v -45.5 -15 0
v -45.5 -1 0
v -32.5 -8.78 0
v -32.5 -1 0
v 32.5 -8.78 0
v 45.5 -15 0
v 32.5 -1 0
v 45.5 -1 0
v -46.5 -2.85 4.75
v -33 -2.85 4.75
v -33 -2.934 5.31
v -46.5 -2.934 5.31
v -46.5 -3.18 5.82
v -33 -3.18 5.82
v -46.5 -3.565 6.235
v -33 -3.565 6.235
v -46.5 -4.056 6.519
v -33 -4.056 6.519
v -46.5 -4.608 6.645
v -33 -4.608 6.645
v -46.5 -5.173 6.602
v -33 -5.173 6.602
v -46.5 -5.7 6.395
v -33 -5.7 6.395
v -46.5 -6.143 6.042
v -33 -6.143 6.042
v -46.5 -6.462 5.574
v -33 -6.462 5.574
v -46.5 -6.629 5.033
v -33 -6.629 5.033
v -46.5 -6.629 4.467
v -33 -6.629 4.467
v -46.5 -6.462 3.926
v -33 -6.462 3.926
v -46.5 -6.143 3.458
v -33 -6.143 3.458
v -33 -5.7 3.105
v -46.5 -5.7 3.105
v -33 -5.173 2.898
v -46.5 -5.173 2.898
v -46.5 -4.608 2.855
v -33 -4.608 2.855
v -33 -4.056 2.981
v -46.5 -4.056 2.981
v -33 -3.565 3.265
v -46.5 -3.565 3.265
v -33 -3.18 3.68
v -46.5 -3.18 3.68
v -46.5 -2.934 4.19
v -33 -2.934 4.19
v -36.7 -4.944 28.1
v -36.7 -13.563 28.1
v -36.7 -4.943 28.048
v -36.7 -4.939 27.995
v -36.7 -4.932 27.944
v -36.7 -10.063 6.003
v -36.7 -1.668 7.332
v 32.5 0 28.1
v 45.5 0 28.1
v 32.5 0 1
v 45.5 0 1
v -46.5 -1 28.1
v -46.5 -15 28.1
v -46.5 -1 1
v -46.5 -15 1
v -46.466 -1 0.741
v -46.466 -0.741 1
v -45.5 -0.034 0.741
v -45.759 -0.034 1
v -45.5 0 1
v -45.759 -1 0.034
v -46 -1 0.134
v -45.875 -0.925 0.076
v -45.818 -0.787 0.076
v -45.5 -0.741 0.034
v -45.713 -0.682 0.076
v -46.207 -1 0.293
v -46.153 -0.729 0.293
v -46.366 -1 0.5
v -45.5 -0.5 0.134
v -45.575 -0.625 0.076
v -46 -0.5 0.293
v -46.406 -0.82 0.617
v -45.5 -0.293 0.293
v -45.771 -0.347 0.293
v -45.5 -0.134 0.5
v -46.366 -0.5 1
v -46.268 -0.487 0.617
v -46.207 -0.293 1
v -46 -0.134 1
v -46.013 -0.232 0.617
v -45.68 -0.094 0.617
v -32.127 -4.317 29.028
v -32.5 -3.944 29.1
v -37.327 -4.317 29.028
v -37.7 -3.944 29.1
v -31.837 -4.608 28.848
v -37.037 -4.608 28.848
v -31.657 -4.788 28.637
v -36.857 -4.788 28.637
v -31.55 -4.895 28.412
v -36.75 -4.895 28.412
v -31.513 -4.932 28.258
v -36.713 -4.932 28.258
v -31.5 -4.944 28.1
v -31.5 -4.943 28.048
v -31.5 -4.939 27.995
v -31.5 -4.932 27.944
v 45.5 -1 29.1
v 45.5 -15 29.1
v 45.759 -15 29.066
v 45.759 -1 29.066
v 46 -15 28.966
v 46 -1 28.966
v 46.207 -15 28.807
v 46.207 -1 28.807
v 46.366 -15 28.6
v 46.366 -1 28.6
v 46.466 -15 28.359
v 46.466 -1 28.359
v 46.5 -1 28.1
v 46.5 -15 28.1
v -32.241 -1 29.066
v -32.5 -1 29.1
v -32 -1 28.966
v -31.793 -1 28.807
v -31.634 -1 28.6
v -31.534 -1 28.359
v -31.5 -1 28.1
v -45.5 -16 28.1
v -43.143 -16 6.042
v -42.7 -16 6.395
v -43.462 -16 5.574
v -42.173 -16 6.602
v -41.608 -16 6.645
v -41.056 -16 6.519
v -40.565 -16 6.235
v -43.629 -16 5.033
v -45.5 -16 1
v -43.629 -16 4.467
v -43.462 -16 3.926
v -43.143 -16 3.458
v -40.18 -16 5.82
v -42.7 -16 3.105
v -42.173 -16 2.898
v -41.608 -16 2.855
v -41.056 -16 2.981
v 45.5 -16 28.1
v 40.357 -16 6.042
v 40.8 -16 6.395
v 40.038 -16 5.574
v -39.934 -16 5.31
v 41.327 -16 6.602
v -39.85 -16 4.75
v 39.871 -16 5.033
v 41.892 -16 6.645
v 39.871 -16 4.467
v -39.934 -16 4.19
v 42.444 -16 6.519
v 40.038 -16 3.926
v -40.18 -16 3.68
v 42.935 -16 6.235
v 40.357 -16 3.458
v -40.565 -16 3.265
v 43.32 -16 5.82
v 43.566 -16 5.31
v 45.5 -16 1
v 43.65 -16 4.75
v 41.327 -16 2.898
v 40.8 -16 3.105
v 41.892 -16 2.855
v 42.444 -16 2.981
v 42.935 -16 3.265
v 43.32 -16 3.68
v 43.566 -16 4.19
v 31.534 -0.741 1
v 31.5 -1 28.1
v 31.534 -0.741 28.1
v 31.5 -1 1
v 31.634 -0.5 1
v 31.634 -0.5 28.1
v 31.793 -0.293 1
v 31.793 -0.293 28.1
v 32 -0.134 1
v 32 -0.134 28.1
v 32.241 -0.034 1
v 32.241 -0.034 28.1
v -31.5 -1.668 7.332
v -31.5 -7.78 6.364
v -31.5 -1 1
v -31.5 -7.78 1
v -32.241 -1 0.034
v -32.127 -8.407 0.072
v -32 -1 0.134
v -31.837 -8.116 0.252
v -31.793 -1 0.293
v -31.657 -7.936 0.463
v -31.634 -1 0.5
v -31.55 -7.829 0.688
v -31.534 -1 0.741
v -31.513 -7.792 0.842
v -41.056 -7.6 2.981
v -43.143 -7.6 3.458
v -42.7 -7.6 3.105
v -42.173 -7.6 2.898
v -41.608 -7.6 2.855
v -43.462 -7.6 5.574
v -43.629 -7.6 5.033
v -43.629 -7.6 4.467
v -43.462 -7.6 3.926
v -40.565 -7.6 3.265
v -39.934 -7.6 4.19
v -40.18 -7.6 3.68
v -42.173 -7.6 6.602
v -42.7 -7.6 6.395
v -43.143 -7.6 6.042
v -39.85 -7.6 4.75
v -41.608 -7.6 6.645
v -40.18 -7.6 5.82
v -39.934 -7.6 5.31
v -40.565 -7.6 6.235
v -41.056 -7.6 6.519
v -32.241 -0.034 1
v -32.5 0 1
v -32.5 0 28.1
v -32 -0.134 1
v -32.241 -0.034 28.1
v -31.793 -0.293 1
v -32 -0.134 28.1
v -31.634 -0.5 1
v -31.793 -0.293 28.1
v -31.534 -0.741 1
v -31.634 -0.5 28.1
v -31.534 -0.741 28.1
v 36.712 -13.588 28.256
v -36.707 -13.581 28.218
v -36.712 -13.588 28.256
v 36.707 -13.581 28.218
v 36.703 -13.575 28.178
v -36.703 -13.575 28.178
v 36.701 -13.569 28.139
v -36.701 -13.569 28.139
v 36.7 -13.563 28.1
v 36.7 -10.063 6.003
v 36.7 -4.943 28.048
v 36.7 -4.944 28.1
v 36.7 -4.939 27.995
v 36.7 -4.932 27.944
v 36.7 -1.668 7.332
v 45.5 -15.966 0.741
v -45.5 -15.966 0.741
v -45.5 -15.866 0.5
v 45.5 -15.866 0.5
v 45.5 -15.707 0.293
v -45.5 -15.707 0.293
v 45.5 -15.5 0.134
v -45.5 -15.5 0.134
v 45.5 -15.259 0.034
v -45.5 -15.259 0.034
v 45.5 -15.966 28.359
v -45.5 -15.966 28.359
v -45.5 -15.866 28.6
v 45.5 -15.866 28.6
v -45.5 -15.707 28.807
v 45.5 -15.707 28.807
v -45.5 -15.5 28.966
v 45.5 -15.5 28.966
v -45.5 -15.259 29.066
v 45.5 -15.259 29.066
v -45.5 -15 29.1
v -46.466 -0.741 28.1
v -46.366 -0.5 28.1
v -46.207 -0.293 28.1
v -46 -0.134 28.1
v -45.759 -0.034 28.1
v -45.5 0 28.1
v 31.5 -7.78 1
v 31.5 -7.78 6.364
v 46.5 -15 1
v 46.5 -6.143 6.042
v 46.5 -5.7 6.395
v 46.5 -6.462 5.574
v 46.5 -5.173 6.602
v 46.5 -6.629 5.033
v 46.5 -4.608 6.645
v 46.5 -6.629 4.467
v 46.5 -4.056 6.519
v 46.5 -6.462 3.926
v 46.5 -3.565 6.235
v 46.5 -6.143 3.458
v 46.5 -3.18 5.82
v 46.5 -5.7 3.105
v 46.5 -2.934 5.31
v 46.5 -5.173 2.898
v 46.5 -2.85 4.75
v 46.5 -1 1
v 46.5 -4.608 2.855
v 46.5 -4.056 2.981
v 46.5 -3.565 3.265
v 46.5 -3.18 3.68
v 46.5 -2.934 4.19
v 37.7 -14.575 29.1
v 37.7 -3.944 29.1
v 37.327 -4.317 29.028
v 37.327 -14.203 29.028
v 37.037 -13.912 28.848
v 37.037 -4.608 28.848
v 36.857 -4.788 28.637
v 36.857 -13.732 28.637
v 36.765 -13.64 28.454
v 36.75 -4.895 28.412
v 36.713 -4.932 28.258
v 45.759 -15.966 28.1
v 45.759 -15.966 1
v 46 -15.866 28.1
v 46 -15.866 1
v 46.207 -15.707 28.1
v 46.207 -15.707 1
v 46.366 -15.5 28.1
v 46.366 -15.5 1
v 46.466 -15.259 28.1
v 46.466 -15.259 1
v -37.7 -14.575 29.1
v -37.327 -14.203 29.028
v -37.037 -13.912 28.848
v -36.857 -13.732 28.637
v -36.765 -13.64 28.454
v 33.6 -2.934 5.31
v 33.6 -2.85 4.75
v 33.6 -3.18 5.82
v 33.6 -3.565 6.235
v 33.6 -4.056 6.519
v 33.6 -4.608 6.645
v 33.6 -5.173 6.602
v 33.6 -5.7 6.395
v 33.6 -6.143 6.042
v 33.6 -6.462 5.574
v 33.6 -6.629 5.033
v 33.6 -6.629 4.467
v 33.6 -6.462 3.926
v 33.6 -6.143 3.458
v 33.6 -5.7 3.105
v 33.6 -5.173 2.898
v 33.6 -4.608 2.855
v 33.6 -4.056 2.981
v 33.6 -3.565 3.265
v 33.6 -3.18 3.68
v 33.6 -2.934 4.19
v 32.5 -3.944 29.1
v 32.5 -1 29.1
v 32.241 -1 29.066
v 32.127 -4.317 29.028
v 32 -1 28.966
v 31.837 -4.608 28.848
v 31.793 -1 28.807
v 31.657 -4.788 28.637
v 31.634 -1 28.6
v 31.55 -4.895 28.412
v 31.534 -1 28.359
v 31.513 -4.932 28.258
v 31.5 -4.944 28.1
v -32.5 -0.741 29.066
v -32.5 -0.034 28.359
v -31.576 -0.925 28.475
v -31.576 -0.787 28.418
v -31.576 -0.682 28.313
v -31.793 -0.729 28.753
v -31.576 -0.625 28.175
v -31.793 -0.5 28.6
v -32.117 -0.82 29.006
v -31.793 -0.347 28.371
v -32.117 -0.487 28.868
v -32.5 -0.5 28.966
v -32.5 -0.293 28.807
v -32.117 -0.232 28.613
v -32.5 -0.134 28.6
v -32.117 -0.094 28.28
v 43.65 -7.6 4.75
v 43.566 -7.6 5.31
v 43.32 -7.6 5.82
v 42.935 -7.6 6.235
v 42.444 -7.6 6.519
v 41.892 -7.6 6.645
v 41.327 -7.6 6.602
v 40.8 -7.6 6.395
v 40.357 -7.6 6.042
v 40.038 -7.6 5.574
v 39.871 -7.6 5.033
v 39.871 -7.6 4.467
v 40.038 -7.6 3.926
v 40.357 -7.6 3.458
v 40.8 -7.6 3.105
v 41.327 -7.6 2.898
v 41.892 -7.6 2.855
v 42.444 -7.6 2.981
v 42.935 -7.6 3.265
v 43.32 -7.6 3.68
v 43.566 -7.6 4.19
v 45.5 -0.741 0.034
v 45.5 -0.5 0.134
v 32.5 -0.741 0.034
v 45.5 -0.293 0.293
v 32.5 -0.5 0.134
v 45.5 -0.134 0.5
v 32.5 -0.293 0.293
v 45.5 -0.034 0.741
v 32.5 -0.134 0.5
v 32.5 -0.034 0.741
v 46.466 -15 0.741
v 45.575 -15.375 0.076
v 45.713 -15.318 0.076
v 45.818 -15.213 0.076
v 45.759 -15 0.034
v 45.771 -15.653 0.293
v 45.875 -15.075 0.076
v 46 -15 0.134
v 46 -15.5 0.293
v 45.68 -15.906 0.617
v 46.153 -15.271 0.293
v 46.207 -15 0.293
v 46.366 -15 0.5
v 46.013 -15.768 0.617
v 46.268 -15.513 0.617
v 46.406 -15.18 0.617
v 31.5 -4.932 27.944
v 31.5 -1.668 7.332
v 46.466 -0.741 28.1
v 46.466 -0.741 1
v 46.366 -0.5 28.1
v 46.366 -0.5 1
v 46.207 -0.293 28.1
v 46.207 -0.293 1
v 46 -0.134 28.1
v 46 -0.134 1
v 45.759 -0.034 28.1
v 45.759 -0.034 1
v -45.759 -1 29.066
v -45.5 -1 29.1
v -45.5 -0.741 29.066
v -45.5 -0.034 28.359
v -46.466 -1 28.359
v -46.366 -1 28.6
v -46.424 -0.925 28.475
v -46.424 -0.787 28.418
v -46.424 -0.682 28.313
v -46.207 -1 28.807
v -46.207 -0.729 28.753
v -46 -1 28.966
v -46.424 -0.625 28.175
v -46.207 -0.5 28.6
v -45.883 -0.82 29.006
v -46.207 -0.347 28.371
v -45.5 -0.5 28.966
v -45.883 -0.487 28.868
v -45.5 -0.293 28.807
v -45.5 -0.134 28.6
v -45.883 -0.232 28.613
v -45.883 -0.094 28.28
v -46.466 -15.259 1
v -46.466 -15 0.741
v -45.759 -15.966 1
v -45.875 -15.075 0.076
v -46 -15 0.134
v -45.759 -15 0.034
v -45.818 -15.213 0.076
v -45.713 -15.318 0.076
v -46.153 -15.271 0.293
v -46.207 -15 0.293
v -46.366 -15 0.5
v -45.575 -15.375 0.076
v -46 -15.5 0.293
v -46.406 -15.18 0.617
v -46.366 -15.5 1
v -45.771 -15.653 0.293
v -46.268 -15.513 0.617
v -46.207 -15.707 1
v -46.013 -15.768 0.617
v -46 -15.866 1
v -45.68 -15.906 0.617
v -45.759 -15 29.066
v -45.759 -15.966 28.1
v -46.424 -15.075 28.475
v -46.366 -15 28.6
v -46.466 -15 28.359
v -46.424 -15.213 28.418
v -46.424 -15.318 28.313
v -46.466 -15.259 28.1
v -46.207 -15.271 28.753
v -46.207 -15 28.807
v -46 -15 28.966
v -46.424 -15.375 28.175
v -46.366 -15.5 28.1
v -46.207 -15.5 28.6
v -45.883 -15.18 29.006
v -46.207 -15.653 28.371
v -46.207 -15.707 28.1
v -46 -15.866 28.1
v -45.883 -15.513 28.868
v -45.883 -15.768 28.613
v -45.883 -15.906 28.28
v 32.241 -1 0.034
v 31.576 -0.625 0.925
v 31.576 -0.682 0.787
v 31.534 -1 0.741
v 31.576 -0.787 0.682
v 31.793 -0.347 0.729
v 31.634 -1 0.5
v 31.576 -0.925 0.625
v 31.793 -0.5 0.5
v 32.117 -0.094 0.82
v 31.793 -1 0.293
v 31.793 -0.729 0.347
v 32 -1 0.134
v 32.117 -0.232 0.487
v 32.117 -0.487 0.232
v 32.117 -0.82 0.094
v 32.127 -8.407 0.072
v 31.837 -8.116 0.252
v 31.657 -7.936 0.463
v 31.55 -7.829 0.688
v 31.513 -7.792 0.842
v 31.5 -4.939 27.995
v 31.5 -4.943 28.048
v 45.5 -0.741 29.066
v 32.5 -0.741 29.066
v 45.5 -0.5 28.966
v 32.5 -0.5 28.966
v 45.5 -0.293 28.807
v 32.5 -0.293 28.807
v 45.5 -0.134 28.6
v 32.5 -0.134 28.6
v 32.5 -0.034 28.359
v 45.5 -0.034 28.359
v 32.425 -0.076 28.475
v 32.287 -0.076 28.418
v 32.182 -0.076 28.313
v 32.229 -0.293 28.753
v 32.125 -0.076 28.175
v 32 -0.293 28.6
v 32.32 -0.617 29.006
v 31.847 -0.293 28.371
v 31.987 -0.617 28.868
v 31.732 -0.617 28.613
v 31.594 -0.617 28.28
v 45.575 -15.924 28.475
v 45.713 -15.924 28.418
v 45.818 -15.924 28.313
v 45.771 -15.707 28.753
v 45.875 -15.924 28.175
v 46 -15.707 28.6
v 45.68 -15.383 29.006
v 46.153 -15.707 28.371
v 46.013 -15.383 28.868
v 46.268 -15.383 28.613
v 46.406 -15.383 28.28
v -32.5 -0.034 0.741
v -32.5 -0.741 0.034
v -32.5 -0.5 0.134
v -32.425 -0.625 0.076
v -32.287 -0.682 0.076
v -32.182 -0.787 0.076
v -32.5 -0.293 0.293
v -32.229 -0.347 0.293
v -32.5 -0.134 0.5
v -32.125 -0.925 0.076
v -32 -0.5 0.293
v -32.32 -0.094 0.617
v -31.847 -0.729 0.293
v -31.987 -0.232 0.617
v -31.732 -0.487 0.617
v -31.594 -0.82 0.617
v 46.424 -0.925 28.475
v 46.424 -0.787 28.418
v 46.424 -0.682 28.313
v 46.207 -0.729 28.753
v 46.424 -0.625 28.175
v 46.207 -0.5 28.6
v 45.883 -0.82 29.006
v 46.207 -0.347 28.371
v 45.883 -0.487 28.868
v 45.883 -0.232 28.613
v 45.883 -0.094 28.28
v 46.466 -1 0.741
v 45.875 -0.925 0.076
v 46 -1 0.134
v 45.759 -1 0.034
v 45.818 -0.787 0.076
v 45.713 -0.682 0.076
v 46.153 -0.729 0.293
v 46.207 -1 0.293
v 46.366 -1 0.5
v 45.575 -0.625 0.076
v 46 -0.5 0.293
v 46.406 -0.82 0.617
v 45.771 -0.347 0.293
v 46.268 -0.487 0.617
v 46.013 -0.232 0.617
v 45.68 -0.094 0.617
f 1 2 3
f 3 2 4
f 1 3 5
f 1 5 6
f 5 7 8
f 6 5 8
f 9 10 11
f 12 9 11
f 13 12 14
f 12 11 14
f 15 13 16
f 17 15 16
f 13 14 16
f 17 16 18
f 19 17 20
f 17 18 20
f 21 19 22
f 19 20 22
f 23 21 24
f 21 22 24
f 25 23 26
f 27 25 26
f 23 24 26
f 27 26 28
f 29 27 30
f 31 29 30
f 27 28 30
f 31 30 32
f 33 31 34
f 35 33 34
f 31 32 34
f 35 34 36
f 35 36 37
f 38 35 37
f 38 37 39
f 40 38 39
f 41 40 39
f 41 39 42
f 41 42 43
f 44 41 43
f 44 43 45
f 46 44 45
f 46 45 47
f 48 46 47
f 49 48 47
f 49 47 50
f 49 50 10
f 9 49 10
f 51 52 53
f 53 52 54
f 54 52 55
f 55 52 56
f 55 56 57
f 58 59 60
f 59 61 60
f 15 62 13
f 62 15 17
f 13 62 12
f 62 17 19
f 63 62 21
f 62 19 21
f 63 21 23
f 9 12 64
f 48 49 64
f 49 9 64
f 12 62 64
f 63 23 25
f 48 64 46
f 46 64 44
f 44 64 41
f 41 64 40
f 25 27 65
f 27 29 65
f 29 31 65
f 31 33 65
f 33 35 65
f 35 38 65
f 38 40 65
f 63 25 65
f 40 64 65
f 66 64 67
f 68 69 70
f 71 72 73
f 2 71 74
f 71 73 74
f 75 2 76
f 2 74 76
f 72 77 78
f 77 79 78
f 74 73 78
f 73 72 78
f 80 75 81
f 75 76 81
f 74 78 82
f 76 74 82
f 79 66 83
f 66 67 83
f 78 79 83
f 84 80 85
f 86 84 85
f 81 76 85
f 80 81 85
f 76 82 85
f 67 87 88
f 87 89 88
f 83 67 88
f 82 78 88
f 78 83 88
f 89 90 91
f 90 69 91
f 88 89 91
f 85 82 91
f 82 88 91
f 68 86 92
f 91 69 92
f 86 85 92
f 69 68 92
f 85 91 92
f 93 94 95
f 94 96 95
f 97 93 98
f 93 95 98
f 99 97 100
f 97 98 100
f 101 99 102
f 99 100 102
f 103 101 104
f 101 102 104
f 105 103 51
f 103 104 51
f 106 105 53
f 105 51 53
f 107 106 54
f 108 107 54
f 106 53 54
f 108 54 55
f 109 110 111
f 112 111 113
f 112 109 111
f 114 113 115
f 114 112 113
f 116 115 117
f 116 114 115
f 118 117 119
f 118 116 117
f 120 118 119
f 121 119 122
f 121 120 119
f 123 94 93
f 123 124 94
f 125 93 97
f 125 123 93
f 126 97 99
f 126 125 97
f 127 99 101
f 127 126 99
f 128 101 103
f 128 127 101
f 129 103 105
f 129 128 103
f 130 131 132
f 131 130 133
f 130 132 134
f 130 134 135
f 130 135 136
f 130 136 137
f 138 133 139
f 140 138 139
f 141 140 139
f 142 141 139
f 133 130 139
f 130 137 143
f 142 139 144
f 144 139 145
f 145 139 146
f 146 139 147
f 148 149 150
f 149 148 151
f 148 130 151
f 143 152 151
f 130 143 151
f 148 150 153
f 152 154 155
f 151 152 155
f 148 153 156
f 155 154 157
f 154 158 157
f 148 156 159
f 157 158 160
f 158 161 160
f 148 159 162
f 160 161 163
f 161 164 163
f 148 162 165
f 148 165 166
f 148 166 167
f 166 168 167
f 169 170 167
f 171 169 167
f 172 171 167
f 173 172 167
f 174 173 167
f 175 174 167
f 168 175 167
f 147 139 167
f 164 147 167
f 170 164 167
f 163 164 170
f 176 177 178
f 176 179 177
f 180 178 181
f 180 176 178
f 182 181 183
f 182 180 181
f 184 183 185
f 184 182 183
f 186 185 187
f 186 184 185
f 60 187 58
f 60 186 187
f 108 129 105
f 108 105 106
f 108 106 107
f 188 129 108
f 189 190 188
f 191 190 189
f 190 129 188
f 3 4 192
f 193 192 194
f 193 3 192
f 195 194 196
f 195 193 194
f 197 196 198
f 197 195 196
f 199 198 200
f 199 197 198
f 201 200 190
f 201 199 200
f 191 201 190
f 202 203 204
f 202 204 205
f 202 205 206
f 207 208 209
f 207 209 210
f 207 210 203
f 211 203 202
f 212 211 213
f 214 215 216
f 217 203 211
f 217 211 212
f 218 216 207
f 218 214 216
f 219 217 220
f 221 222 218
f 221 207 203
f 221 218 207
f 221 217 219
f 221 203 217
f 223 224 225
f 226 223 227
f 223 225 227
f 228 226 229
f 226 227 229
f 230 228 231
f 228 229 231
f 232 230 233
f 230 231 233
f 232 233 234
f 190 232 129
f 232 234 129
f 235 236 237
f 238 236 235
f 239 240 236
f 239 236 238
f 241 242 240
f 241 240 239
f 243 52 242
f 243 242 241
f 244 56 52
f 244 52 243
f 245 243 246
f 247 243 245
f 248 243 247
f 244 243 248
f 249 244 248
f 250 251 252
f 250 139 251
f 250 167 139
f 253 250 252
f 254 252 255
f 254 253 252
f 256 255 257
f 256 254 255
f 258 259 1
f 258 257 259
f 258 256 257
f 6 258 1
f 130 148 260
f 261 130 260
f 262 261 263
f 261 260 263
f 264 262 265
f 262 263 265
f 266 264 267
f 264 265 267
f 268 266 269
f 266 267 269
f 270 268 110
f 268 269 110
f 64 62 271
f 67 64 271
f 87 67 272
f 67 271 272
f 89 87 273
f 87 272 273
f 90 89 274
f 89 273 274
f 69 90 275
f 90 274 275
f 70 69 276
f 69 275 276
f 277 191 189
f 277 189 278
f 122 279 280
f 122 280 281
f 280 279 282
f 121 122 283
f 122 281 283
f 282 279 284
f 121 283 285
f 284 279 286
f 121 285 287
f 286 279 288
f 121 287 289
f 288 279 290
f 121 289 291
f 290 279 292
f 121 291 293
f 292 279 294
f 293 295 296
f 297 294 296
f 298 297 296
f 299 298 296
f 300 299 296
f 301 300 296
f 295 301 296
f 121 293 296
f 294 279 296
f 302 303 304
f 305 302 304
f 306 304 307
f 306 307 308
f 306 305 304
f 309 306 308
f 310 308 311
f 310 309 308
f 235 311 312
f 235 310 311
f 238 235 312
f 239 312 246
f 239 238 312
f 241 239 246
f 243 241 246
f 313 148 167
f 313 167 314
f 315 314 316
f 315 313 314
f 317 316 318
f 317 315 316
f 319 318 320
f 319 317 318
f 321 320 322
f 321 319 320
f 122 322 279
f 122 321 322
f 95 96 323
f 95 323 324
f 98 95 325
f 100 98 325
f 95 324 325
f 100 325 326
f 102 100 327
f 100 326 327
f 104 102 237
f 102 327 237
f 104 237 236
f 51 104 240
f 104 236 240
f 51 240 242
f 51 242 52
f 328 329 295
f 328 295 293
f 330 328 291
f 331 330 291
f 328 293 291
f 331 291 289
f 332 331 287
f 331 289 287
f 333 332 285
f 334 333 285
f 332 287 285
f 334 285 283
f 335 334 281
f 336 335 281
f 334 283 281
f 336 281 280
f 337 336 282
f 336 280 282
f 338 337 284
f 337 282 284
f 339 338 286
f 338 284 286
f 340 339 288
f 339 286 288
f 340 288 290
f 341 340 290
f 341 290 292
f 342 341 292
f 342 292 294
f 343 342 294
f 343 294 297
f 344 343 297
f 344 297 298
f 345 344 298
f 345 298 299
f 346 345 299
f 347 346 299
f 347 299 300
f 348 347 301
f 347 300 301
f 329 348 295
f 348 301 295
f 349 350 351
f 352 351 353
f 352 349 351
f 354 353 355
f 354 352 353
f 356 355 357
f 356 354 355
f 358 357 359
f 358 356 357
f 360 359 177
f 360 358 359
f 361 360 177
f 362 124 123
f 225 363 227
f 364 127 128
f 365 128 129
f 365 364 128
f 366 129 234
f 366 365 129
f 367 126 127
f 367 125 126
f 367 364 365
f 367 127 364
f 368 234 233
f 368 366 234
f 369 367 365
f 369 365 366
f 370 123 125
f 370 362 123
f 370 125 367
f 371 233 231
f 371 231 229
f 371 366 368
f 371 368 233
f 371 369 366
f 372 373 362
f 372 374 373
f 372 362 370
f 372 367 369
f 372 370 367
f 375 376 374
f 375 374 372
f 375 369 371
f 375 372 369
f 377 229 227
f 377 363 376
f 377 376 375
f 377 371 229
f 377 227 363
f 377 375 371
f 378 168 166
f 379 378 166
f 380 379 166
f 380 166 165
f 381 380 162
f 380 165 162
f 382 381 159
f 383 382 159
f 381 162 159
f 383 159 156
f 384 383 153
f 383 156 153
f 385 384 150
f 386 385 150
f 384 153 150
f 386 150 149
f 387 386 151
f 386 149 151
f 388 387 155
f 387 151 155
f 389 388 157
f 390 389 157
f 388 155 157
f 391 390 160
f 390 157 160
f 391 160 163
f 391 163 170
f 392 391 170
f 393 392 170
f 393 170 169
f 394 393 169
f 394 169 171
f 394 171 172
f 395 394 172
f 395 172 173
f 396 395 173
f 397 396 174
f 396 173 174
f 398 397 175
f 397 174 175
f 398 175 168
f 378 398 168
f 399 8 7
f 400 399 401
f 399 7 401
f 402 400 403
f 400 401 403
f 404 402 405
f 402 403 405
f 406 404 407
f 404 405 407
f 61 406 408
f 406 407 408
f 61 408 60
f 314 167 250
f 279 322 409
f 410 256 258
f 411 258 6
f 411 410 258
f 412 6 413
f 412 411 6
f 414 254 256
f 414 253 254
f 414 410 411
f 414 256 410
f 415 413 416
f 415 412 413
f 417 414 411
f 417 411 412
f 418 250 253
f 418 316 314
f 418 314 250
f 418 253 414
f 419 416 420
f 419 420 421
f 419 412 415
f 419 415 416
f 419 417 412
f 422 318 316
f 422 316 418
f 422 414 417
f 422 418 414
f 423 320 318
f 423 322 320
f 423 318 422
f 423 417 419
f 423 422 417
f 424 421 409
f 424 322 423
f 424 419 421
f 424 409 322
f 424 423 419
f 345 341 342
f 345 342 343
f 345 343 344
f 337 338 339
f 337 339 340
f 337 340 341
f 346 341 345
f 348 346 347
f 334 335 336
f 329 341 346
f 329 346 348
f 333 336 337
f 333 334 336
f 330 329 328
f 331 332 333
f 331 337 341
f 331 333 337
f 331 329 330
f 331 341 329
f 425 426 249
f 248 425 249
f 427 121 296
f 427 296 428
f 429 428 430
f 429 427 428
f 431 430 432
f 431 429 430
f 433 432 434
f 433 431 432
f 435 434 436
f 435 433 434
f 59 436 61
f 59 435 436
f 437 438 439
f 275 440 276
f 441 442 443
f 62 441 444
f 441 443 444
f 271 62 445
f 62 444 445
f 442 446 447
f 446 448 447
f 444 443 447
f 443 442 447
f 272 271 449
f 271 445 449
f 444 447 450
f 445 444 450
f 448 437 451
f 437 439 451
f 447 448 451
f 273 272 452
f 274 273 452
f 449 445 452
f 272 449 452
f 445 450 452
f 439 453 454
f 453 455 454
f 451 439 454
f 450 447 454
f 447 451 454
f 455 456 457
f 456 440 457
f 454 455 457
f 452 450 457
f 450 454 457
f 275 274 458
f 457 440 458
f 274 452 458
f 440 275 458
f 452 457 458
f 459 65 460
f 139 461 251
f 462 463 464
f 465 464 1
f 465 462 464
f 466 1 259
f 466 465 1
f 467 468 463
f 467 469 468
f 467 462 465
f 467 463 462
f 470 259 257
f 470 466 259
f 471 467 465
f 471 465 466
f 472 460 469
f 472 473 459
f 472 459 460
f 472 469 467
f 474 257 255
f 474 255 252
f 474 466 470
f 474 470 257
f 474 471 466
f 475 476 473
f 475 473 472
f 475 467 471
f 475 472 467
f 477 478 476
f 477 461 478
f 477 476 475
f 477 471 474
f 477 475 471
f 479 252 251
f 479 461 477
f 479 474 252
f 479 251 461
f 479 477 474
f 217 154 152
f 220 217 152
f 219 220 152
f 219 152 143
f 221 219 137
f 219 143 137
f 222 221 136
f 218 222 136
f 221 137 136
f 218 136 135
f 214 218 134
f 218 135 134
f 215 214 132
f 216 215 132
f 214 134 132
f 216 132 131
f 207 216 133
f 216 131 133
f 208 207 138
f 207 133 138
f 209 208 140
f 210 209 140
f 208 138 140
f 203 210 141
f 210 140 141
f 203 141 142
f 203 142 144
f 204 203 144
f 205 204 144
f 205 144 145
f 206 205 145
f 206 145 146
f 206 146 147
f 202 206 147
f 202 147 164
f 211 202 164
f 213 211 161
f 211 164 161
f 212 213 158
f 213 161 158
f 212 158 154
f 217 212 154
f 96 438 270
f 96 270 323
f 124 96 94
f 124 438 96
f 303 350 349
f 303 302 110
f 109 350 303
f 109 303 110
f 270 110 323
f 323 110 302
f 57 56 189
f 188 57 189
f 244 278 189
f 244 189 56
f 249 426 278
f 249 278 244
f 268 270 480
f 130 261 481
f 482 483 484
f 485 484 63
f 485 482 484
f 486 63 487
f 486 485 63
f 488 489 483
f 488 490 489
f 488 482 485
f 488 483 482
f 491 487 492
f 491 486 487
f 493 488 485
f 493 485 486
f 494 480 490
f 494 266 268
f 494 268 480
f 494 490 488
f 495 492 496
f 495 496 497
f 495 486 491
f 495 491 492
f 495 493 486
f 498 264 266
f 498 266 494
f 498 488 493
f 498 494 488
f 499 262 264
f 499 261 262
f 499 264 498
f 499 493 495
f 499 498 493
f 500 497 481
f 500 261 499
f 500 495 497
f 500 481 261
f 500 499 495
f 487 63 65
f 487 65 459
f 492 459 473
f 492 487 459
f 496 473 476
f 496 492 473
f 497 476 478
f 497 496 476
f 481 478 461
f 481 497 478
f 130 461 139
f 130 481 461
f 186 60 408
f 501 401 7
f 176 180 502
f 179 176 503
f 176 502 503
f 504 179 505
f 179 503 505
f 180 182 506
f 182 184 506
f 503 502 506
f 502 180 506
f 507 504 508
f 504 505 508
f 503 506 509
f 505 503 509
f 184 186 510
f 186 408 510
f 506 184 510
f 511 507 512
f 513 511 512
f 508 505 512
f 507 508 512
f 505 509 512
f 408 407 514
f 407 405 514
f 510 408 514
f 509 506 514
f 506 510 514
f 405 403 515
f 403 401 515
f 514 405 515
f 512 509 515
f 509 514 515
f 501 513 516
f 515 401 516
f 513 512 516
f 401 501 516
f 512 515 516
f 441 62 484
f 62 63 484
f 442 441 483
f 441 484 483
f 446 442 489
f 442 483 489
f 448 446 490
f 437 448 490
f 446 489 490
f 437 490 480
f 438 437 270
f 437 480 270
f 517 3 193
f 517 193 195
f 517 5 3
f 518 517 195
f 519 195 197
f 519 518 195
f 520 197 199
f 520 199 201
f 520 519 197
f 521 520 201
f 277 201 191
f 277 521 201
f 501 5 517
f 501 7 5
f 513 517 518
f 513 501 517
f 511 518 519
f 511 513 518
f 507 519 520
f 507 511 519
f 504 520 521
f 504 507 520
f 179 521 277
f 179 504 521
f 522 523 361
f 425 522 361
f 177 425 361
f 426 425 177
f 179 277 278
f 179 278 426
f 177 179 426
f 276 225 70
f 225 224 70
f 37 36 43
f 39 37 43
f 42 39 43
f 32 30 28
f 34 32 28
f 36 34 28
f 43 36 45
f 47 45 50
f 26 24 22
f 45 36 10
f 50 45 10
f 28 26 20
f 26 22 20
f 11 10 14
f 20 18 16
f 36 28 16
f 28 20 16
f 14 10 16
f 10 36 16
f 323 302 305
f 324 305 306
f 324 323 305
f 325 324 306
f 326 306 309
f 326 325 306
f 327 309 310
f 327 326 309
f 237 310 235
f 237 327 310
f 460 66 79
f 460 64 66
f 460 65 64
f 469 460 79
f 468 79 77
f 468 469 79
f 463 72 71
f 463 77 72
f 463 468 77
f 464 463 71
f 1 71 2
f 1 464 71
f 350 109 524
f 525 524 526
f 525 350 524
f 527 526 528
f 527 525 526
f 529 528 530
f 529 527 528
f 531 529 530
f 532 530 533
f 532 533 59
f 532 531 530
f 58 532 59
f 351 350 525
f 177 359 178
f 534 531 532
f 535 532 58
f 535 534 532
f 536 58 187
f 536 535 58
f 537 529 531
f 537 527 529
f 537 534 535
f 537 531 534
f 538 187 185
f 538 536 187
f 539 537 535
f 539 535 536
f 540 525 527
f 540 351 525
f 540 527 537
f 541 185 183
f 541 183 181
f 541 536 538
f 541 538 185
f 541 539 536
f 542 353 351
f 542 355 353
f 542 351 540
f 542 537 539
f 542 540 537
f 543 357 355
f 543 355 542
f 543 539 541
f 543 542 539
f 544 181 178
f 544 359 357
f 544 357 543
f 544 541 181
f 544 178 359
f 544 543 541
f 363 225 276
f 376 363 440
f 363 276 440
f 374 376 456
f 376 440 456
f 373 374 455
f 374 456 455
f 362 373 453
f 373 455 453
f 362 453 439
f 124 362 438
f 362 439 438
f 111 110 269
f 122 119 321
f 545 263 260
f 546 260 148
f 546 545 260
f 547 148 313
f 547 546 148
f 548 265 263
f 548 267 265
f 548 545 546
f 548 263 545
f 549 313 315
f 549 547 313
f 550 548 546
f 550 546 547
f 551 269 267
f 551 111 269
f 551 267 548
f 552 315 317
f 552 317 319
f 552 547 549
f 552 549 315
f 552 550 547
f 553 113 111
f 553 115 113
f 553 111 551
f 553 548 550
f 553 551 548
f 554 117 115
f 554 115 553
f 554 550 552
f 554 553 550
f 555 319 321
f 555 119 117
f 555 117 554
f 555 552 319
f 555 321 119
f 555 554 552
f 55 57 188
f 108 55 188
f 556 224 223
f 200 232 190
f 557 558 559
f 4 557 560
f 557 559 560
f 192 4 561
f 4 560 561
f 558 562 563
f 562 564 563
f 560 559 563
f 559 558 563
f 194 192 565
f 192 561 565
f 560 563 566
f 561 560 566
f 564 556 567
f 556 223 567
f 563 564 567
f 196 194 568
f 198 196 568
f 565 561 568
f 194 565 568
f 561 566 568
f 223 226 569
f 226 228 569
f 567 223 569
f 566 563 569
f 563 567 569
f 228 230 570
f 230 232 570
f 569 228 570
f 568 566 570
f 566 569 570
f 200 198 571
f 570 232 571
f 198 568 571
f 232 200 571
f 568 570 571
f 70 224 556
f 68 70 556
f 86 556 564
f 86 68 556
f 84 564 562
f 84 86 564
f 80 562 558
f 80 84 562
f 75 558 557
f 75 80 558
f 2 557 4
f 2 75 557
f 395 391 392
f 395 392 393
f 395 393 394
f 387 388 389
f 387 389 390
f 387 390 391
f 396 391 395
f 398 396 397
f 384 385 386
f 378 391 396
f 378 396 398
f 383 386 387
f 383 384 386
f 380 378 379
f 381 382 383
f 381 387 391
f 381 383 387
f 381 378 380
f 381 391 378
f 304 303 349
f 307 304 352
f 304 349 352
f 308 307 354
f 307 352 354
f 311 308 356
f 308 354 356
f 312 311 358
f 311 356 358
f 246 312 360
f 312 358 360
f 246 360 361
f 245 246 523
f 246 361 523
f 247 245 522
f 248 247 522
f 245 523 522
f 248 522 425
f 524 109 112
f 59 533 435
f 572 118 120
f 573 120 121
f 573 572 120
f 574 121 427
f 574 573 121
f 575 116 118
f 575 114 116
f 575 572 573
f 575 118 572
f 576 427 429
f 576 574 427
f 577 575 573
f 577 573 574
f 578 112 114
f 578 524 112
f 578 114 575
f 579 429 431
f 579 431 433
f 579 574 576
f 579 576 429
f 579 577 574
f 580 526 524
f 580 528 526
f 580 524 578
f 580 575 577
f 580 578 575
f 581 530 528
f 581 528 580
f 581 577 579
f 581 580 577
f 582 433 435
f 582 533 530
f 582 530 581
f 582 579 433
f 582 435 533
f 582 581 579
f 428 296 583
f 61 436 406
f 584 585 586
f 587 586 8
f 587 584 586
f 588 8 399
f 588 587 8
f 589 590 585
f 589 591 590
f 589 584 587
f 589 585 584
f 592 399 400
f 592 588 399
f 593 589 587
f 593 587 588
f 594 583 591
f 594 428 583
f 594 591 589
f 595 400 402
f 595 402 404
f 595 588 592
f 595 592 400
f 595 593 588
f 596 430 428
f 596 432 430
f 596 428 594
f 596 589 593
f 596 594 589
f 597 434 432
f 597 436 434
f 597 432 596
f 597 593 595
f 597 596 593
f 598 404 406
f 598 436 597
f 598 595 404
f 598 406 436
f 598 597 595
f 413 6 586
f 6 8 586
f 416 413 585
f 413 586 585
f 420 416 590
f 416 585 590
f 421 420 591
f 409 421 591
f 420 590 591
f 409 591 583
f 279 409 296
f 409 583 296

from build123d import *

# Parameters (mm, degrees)
F0_W      = 63
F0_H      = 7.7795209363
F1_DEPTH  = 29.1
F4_START  = 5
F3_W      = 73.4
F3_H      = 8.5
F4_DEPTH  = 34.9
F0_H_2    = 17.5400283188
F5_DEPTH  = 44.7
F6_R      = 1
F7_R      = 1.9
F8_DEPTH  = 12.9
F9_R      = 1.9
F10_DEPTH = 8.4
F11_START = -79.5
F11_DEPTH = 35.3


with BuildPart() as f1:
    # F0 (on Top) → F1 (new body)
    with BuildSketch(Plane.XY):
        Polygon((-31.5, 0), (-46.5, 0), (-46.5, -16), (46.5, -16), (46.5, 0), (31.5, 0), (31.5, -7.7795209363), (-31.5, -7.7795209363), align=None)
        with Locations((0, -3.8897604682)):
            Rectangle(F0_W, F0_H)
    extrude(amount=F1_DEPTH)

    # F3 (on line) → F4 (cut)
    with BuildSketch(Plane(origin=(0, -0.3915478696, 2.472135955), x_dir=(1, 0, 0), z_dir=(0, -0.156434465, 0.9876883406)).offset(F4_START)):
        with Locations((0, -4.75)):
            Rectangle(F3_W, F3_H)
    extrude(amount=F4_DEPTH, mode=Mode.SUBTRACT)

    # F0 (on Top) → F5 (cut)
    with BuildSketch(Plane.XY):
        with Locations((0, 8.7700141594)):
            Rectangle(F0_W, F0_H_2)
        with Locations((0, -3.8897604682)):
            Rectangle(F0_W, F0_H)
    extrude(amount=F5_DEPTH, mode=Mode.SUBTRACT)

    # F6
    f6_edges = [f1.edges().sort_by_distance(p)[0] for p in [
        (-39, 0, 29.1),
        (-31.5, -2.55761, 29.1),
        (-34.1, -5.11522, 29.1),
        (-36.7, -9.418197, 29.1),
        (0, -13.721173, 29.1),
        (36.7, -9.418197, 29.1),
        (34.1, -5.11522, 29.1),
        (31.5, -2.55761, 29.1),
        (39, 0, 29.1),
        (46.5, -8, 29.1),
        (0, -16, 29.1),
        (-46.5, -8, 29.1),
        (-46.5, 0, 14.55),
        (-46.5, -16, 14.55),
        (-46.5, -8, 0),
        (46.5, -16, 14.55),
        (0, -16, 0),
        (46.5, 0, 14.55),
        (46.5, -8, 0),
        (39, 0, 0),
        (31.5, 0, 14.55),
        (-31.5, 0, 14.55),
        (-39, 0, 0),
        (-31.5, -3.88976, 0),
        (0, -7.779521, 0),
        (31.5, -3.88976, 0),
    ]]
    fillet(f6_edges, radius=F6_R)

    # F7 (on face) → F8 (cut)
    with BuildSketch(Plane.YZ.offset(46.5)):
        with Locations((-4.75, 4.75)):
            Circle(F7_R)
    extrude(amount=-F8_DEPTH, mode=Mode.SUBTRACT)

    # F9 (on face) → F10 (cut)
    with BuildSketch(Plane.XZ.offset(16)):
        with Locations((41.75, 4.75)):
            Circle(F9_R)
        with Locations((-41.75, 4.75)):
            Circle(F9_R)
    extrude(amount=-F10_DEPTH, mode=Mode.SUBTRACT)

    # F7 (on face) → F11 (cut)
    with BuildSketch(Plane.YZ.offset(46.5).offset(F11_START)):
        with Locations((-4.75, 4.75)):
            Circle(F7_R)
    extrude(amount=-F11_DEPTH, mode=Mode.SUBTRACT)


solid = f1.part
